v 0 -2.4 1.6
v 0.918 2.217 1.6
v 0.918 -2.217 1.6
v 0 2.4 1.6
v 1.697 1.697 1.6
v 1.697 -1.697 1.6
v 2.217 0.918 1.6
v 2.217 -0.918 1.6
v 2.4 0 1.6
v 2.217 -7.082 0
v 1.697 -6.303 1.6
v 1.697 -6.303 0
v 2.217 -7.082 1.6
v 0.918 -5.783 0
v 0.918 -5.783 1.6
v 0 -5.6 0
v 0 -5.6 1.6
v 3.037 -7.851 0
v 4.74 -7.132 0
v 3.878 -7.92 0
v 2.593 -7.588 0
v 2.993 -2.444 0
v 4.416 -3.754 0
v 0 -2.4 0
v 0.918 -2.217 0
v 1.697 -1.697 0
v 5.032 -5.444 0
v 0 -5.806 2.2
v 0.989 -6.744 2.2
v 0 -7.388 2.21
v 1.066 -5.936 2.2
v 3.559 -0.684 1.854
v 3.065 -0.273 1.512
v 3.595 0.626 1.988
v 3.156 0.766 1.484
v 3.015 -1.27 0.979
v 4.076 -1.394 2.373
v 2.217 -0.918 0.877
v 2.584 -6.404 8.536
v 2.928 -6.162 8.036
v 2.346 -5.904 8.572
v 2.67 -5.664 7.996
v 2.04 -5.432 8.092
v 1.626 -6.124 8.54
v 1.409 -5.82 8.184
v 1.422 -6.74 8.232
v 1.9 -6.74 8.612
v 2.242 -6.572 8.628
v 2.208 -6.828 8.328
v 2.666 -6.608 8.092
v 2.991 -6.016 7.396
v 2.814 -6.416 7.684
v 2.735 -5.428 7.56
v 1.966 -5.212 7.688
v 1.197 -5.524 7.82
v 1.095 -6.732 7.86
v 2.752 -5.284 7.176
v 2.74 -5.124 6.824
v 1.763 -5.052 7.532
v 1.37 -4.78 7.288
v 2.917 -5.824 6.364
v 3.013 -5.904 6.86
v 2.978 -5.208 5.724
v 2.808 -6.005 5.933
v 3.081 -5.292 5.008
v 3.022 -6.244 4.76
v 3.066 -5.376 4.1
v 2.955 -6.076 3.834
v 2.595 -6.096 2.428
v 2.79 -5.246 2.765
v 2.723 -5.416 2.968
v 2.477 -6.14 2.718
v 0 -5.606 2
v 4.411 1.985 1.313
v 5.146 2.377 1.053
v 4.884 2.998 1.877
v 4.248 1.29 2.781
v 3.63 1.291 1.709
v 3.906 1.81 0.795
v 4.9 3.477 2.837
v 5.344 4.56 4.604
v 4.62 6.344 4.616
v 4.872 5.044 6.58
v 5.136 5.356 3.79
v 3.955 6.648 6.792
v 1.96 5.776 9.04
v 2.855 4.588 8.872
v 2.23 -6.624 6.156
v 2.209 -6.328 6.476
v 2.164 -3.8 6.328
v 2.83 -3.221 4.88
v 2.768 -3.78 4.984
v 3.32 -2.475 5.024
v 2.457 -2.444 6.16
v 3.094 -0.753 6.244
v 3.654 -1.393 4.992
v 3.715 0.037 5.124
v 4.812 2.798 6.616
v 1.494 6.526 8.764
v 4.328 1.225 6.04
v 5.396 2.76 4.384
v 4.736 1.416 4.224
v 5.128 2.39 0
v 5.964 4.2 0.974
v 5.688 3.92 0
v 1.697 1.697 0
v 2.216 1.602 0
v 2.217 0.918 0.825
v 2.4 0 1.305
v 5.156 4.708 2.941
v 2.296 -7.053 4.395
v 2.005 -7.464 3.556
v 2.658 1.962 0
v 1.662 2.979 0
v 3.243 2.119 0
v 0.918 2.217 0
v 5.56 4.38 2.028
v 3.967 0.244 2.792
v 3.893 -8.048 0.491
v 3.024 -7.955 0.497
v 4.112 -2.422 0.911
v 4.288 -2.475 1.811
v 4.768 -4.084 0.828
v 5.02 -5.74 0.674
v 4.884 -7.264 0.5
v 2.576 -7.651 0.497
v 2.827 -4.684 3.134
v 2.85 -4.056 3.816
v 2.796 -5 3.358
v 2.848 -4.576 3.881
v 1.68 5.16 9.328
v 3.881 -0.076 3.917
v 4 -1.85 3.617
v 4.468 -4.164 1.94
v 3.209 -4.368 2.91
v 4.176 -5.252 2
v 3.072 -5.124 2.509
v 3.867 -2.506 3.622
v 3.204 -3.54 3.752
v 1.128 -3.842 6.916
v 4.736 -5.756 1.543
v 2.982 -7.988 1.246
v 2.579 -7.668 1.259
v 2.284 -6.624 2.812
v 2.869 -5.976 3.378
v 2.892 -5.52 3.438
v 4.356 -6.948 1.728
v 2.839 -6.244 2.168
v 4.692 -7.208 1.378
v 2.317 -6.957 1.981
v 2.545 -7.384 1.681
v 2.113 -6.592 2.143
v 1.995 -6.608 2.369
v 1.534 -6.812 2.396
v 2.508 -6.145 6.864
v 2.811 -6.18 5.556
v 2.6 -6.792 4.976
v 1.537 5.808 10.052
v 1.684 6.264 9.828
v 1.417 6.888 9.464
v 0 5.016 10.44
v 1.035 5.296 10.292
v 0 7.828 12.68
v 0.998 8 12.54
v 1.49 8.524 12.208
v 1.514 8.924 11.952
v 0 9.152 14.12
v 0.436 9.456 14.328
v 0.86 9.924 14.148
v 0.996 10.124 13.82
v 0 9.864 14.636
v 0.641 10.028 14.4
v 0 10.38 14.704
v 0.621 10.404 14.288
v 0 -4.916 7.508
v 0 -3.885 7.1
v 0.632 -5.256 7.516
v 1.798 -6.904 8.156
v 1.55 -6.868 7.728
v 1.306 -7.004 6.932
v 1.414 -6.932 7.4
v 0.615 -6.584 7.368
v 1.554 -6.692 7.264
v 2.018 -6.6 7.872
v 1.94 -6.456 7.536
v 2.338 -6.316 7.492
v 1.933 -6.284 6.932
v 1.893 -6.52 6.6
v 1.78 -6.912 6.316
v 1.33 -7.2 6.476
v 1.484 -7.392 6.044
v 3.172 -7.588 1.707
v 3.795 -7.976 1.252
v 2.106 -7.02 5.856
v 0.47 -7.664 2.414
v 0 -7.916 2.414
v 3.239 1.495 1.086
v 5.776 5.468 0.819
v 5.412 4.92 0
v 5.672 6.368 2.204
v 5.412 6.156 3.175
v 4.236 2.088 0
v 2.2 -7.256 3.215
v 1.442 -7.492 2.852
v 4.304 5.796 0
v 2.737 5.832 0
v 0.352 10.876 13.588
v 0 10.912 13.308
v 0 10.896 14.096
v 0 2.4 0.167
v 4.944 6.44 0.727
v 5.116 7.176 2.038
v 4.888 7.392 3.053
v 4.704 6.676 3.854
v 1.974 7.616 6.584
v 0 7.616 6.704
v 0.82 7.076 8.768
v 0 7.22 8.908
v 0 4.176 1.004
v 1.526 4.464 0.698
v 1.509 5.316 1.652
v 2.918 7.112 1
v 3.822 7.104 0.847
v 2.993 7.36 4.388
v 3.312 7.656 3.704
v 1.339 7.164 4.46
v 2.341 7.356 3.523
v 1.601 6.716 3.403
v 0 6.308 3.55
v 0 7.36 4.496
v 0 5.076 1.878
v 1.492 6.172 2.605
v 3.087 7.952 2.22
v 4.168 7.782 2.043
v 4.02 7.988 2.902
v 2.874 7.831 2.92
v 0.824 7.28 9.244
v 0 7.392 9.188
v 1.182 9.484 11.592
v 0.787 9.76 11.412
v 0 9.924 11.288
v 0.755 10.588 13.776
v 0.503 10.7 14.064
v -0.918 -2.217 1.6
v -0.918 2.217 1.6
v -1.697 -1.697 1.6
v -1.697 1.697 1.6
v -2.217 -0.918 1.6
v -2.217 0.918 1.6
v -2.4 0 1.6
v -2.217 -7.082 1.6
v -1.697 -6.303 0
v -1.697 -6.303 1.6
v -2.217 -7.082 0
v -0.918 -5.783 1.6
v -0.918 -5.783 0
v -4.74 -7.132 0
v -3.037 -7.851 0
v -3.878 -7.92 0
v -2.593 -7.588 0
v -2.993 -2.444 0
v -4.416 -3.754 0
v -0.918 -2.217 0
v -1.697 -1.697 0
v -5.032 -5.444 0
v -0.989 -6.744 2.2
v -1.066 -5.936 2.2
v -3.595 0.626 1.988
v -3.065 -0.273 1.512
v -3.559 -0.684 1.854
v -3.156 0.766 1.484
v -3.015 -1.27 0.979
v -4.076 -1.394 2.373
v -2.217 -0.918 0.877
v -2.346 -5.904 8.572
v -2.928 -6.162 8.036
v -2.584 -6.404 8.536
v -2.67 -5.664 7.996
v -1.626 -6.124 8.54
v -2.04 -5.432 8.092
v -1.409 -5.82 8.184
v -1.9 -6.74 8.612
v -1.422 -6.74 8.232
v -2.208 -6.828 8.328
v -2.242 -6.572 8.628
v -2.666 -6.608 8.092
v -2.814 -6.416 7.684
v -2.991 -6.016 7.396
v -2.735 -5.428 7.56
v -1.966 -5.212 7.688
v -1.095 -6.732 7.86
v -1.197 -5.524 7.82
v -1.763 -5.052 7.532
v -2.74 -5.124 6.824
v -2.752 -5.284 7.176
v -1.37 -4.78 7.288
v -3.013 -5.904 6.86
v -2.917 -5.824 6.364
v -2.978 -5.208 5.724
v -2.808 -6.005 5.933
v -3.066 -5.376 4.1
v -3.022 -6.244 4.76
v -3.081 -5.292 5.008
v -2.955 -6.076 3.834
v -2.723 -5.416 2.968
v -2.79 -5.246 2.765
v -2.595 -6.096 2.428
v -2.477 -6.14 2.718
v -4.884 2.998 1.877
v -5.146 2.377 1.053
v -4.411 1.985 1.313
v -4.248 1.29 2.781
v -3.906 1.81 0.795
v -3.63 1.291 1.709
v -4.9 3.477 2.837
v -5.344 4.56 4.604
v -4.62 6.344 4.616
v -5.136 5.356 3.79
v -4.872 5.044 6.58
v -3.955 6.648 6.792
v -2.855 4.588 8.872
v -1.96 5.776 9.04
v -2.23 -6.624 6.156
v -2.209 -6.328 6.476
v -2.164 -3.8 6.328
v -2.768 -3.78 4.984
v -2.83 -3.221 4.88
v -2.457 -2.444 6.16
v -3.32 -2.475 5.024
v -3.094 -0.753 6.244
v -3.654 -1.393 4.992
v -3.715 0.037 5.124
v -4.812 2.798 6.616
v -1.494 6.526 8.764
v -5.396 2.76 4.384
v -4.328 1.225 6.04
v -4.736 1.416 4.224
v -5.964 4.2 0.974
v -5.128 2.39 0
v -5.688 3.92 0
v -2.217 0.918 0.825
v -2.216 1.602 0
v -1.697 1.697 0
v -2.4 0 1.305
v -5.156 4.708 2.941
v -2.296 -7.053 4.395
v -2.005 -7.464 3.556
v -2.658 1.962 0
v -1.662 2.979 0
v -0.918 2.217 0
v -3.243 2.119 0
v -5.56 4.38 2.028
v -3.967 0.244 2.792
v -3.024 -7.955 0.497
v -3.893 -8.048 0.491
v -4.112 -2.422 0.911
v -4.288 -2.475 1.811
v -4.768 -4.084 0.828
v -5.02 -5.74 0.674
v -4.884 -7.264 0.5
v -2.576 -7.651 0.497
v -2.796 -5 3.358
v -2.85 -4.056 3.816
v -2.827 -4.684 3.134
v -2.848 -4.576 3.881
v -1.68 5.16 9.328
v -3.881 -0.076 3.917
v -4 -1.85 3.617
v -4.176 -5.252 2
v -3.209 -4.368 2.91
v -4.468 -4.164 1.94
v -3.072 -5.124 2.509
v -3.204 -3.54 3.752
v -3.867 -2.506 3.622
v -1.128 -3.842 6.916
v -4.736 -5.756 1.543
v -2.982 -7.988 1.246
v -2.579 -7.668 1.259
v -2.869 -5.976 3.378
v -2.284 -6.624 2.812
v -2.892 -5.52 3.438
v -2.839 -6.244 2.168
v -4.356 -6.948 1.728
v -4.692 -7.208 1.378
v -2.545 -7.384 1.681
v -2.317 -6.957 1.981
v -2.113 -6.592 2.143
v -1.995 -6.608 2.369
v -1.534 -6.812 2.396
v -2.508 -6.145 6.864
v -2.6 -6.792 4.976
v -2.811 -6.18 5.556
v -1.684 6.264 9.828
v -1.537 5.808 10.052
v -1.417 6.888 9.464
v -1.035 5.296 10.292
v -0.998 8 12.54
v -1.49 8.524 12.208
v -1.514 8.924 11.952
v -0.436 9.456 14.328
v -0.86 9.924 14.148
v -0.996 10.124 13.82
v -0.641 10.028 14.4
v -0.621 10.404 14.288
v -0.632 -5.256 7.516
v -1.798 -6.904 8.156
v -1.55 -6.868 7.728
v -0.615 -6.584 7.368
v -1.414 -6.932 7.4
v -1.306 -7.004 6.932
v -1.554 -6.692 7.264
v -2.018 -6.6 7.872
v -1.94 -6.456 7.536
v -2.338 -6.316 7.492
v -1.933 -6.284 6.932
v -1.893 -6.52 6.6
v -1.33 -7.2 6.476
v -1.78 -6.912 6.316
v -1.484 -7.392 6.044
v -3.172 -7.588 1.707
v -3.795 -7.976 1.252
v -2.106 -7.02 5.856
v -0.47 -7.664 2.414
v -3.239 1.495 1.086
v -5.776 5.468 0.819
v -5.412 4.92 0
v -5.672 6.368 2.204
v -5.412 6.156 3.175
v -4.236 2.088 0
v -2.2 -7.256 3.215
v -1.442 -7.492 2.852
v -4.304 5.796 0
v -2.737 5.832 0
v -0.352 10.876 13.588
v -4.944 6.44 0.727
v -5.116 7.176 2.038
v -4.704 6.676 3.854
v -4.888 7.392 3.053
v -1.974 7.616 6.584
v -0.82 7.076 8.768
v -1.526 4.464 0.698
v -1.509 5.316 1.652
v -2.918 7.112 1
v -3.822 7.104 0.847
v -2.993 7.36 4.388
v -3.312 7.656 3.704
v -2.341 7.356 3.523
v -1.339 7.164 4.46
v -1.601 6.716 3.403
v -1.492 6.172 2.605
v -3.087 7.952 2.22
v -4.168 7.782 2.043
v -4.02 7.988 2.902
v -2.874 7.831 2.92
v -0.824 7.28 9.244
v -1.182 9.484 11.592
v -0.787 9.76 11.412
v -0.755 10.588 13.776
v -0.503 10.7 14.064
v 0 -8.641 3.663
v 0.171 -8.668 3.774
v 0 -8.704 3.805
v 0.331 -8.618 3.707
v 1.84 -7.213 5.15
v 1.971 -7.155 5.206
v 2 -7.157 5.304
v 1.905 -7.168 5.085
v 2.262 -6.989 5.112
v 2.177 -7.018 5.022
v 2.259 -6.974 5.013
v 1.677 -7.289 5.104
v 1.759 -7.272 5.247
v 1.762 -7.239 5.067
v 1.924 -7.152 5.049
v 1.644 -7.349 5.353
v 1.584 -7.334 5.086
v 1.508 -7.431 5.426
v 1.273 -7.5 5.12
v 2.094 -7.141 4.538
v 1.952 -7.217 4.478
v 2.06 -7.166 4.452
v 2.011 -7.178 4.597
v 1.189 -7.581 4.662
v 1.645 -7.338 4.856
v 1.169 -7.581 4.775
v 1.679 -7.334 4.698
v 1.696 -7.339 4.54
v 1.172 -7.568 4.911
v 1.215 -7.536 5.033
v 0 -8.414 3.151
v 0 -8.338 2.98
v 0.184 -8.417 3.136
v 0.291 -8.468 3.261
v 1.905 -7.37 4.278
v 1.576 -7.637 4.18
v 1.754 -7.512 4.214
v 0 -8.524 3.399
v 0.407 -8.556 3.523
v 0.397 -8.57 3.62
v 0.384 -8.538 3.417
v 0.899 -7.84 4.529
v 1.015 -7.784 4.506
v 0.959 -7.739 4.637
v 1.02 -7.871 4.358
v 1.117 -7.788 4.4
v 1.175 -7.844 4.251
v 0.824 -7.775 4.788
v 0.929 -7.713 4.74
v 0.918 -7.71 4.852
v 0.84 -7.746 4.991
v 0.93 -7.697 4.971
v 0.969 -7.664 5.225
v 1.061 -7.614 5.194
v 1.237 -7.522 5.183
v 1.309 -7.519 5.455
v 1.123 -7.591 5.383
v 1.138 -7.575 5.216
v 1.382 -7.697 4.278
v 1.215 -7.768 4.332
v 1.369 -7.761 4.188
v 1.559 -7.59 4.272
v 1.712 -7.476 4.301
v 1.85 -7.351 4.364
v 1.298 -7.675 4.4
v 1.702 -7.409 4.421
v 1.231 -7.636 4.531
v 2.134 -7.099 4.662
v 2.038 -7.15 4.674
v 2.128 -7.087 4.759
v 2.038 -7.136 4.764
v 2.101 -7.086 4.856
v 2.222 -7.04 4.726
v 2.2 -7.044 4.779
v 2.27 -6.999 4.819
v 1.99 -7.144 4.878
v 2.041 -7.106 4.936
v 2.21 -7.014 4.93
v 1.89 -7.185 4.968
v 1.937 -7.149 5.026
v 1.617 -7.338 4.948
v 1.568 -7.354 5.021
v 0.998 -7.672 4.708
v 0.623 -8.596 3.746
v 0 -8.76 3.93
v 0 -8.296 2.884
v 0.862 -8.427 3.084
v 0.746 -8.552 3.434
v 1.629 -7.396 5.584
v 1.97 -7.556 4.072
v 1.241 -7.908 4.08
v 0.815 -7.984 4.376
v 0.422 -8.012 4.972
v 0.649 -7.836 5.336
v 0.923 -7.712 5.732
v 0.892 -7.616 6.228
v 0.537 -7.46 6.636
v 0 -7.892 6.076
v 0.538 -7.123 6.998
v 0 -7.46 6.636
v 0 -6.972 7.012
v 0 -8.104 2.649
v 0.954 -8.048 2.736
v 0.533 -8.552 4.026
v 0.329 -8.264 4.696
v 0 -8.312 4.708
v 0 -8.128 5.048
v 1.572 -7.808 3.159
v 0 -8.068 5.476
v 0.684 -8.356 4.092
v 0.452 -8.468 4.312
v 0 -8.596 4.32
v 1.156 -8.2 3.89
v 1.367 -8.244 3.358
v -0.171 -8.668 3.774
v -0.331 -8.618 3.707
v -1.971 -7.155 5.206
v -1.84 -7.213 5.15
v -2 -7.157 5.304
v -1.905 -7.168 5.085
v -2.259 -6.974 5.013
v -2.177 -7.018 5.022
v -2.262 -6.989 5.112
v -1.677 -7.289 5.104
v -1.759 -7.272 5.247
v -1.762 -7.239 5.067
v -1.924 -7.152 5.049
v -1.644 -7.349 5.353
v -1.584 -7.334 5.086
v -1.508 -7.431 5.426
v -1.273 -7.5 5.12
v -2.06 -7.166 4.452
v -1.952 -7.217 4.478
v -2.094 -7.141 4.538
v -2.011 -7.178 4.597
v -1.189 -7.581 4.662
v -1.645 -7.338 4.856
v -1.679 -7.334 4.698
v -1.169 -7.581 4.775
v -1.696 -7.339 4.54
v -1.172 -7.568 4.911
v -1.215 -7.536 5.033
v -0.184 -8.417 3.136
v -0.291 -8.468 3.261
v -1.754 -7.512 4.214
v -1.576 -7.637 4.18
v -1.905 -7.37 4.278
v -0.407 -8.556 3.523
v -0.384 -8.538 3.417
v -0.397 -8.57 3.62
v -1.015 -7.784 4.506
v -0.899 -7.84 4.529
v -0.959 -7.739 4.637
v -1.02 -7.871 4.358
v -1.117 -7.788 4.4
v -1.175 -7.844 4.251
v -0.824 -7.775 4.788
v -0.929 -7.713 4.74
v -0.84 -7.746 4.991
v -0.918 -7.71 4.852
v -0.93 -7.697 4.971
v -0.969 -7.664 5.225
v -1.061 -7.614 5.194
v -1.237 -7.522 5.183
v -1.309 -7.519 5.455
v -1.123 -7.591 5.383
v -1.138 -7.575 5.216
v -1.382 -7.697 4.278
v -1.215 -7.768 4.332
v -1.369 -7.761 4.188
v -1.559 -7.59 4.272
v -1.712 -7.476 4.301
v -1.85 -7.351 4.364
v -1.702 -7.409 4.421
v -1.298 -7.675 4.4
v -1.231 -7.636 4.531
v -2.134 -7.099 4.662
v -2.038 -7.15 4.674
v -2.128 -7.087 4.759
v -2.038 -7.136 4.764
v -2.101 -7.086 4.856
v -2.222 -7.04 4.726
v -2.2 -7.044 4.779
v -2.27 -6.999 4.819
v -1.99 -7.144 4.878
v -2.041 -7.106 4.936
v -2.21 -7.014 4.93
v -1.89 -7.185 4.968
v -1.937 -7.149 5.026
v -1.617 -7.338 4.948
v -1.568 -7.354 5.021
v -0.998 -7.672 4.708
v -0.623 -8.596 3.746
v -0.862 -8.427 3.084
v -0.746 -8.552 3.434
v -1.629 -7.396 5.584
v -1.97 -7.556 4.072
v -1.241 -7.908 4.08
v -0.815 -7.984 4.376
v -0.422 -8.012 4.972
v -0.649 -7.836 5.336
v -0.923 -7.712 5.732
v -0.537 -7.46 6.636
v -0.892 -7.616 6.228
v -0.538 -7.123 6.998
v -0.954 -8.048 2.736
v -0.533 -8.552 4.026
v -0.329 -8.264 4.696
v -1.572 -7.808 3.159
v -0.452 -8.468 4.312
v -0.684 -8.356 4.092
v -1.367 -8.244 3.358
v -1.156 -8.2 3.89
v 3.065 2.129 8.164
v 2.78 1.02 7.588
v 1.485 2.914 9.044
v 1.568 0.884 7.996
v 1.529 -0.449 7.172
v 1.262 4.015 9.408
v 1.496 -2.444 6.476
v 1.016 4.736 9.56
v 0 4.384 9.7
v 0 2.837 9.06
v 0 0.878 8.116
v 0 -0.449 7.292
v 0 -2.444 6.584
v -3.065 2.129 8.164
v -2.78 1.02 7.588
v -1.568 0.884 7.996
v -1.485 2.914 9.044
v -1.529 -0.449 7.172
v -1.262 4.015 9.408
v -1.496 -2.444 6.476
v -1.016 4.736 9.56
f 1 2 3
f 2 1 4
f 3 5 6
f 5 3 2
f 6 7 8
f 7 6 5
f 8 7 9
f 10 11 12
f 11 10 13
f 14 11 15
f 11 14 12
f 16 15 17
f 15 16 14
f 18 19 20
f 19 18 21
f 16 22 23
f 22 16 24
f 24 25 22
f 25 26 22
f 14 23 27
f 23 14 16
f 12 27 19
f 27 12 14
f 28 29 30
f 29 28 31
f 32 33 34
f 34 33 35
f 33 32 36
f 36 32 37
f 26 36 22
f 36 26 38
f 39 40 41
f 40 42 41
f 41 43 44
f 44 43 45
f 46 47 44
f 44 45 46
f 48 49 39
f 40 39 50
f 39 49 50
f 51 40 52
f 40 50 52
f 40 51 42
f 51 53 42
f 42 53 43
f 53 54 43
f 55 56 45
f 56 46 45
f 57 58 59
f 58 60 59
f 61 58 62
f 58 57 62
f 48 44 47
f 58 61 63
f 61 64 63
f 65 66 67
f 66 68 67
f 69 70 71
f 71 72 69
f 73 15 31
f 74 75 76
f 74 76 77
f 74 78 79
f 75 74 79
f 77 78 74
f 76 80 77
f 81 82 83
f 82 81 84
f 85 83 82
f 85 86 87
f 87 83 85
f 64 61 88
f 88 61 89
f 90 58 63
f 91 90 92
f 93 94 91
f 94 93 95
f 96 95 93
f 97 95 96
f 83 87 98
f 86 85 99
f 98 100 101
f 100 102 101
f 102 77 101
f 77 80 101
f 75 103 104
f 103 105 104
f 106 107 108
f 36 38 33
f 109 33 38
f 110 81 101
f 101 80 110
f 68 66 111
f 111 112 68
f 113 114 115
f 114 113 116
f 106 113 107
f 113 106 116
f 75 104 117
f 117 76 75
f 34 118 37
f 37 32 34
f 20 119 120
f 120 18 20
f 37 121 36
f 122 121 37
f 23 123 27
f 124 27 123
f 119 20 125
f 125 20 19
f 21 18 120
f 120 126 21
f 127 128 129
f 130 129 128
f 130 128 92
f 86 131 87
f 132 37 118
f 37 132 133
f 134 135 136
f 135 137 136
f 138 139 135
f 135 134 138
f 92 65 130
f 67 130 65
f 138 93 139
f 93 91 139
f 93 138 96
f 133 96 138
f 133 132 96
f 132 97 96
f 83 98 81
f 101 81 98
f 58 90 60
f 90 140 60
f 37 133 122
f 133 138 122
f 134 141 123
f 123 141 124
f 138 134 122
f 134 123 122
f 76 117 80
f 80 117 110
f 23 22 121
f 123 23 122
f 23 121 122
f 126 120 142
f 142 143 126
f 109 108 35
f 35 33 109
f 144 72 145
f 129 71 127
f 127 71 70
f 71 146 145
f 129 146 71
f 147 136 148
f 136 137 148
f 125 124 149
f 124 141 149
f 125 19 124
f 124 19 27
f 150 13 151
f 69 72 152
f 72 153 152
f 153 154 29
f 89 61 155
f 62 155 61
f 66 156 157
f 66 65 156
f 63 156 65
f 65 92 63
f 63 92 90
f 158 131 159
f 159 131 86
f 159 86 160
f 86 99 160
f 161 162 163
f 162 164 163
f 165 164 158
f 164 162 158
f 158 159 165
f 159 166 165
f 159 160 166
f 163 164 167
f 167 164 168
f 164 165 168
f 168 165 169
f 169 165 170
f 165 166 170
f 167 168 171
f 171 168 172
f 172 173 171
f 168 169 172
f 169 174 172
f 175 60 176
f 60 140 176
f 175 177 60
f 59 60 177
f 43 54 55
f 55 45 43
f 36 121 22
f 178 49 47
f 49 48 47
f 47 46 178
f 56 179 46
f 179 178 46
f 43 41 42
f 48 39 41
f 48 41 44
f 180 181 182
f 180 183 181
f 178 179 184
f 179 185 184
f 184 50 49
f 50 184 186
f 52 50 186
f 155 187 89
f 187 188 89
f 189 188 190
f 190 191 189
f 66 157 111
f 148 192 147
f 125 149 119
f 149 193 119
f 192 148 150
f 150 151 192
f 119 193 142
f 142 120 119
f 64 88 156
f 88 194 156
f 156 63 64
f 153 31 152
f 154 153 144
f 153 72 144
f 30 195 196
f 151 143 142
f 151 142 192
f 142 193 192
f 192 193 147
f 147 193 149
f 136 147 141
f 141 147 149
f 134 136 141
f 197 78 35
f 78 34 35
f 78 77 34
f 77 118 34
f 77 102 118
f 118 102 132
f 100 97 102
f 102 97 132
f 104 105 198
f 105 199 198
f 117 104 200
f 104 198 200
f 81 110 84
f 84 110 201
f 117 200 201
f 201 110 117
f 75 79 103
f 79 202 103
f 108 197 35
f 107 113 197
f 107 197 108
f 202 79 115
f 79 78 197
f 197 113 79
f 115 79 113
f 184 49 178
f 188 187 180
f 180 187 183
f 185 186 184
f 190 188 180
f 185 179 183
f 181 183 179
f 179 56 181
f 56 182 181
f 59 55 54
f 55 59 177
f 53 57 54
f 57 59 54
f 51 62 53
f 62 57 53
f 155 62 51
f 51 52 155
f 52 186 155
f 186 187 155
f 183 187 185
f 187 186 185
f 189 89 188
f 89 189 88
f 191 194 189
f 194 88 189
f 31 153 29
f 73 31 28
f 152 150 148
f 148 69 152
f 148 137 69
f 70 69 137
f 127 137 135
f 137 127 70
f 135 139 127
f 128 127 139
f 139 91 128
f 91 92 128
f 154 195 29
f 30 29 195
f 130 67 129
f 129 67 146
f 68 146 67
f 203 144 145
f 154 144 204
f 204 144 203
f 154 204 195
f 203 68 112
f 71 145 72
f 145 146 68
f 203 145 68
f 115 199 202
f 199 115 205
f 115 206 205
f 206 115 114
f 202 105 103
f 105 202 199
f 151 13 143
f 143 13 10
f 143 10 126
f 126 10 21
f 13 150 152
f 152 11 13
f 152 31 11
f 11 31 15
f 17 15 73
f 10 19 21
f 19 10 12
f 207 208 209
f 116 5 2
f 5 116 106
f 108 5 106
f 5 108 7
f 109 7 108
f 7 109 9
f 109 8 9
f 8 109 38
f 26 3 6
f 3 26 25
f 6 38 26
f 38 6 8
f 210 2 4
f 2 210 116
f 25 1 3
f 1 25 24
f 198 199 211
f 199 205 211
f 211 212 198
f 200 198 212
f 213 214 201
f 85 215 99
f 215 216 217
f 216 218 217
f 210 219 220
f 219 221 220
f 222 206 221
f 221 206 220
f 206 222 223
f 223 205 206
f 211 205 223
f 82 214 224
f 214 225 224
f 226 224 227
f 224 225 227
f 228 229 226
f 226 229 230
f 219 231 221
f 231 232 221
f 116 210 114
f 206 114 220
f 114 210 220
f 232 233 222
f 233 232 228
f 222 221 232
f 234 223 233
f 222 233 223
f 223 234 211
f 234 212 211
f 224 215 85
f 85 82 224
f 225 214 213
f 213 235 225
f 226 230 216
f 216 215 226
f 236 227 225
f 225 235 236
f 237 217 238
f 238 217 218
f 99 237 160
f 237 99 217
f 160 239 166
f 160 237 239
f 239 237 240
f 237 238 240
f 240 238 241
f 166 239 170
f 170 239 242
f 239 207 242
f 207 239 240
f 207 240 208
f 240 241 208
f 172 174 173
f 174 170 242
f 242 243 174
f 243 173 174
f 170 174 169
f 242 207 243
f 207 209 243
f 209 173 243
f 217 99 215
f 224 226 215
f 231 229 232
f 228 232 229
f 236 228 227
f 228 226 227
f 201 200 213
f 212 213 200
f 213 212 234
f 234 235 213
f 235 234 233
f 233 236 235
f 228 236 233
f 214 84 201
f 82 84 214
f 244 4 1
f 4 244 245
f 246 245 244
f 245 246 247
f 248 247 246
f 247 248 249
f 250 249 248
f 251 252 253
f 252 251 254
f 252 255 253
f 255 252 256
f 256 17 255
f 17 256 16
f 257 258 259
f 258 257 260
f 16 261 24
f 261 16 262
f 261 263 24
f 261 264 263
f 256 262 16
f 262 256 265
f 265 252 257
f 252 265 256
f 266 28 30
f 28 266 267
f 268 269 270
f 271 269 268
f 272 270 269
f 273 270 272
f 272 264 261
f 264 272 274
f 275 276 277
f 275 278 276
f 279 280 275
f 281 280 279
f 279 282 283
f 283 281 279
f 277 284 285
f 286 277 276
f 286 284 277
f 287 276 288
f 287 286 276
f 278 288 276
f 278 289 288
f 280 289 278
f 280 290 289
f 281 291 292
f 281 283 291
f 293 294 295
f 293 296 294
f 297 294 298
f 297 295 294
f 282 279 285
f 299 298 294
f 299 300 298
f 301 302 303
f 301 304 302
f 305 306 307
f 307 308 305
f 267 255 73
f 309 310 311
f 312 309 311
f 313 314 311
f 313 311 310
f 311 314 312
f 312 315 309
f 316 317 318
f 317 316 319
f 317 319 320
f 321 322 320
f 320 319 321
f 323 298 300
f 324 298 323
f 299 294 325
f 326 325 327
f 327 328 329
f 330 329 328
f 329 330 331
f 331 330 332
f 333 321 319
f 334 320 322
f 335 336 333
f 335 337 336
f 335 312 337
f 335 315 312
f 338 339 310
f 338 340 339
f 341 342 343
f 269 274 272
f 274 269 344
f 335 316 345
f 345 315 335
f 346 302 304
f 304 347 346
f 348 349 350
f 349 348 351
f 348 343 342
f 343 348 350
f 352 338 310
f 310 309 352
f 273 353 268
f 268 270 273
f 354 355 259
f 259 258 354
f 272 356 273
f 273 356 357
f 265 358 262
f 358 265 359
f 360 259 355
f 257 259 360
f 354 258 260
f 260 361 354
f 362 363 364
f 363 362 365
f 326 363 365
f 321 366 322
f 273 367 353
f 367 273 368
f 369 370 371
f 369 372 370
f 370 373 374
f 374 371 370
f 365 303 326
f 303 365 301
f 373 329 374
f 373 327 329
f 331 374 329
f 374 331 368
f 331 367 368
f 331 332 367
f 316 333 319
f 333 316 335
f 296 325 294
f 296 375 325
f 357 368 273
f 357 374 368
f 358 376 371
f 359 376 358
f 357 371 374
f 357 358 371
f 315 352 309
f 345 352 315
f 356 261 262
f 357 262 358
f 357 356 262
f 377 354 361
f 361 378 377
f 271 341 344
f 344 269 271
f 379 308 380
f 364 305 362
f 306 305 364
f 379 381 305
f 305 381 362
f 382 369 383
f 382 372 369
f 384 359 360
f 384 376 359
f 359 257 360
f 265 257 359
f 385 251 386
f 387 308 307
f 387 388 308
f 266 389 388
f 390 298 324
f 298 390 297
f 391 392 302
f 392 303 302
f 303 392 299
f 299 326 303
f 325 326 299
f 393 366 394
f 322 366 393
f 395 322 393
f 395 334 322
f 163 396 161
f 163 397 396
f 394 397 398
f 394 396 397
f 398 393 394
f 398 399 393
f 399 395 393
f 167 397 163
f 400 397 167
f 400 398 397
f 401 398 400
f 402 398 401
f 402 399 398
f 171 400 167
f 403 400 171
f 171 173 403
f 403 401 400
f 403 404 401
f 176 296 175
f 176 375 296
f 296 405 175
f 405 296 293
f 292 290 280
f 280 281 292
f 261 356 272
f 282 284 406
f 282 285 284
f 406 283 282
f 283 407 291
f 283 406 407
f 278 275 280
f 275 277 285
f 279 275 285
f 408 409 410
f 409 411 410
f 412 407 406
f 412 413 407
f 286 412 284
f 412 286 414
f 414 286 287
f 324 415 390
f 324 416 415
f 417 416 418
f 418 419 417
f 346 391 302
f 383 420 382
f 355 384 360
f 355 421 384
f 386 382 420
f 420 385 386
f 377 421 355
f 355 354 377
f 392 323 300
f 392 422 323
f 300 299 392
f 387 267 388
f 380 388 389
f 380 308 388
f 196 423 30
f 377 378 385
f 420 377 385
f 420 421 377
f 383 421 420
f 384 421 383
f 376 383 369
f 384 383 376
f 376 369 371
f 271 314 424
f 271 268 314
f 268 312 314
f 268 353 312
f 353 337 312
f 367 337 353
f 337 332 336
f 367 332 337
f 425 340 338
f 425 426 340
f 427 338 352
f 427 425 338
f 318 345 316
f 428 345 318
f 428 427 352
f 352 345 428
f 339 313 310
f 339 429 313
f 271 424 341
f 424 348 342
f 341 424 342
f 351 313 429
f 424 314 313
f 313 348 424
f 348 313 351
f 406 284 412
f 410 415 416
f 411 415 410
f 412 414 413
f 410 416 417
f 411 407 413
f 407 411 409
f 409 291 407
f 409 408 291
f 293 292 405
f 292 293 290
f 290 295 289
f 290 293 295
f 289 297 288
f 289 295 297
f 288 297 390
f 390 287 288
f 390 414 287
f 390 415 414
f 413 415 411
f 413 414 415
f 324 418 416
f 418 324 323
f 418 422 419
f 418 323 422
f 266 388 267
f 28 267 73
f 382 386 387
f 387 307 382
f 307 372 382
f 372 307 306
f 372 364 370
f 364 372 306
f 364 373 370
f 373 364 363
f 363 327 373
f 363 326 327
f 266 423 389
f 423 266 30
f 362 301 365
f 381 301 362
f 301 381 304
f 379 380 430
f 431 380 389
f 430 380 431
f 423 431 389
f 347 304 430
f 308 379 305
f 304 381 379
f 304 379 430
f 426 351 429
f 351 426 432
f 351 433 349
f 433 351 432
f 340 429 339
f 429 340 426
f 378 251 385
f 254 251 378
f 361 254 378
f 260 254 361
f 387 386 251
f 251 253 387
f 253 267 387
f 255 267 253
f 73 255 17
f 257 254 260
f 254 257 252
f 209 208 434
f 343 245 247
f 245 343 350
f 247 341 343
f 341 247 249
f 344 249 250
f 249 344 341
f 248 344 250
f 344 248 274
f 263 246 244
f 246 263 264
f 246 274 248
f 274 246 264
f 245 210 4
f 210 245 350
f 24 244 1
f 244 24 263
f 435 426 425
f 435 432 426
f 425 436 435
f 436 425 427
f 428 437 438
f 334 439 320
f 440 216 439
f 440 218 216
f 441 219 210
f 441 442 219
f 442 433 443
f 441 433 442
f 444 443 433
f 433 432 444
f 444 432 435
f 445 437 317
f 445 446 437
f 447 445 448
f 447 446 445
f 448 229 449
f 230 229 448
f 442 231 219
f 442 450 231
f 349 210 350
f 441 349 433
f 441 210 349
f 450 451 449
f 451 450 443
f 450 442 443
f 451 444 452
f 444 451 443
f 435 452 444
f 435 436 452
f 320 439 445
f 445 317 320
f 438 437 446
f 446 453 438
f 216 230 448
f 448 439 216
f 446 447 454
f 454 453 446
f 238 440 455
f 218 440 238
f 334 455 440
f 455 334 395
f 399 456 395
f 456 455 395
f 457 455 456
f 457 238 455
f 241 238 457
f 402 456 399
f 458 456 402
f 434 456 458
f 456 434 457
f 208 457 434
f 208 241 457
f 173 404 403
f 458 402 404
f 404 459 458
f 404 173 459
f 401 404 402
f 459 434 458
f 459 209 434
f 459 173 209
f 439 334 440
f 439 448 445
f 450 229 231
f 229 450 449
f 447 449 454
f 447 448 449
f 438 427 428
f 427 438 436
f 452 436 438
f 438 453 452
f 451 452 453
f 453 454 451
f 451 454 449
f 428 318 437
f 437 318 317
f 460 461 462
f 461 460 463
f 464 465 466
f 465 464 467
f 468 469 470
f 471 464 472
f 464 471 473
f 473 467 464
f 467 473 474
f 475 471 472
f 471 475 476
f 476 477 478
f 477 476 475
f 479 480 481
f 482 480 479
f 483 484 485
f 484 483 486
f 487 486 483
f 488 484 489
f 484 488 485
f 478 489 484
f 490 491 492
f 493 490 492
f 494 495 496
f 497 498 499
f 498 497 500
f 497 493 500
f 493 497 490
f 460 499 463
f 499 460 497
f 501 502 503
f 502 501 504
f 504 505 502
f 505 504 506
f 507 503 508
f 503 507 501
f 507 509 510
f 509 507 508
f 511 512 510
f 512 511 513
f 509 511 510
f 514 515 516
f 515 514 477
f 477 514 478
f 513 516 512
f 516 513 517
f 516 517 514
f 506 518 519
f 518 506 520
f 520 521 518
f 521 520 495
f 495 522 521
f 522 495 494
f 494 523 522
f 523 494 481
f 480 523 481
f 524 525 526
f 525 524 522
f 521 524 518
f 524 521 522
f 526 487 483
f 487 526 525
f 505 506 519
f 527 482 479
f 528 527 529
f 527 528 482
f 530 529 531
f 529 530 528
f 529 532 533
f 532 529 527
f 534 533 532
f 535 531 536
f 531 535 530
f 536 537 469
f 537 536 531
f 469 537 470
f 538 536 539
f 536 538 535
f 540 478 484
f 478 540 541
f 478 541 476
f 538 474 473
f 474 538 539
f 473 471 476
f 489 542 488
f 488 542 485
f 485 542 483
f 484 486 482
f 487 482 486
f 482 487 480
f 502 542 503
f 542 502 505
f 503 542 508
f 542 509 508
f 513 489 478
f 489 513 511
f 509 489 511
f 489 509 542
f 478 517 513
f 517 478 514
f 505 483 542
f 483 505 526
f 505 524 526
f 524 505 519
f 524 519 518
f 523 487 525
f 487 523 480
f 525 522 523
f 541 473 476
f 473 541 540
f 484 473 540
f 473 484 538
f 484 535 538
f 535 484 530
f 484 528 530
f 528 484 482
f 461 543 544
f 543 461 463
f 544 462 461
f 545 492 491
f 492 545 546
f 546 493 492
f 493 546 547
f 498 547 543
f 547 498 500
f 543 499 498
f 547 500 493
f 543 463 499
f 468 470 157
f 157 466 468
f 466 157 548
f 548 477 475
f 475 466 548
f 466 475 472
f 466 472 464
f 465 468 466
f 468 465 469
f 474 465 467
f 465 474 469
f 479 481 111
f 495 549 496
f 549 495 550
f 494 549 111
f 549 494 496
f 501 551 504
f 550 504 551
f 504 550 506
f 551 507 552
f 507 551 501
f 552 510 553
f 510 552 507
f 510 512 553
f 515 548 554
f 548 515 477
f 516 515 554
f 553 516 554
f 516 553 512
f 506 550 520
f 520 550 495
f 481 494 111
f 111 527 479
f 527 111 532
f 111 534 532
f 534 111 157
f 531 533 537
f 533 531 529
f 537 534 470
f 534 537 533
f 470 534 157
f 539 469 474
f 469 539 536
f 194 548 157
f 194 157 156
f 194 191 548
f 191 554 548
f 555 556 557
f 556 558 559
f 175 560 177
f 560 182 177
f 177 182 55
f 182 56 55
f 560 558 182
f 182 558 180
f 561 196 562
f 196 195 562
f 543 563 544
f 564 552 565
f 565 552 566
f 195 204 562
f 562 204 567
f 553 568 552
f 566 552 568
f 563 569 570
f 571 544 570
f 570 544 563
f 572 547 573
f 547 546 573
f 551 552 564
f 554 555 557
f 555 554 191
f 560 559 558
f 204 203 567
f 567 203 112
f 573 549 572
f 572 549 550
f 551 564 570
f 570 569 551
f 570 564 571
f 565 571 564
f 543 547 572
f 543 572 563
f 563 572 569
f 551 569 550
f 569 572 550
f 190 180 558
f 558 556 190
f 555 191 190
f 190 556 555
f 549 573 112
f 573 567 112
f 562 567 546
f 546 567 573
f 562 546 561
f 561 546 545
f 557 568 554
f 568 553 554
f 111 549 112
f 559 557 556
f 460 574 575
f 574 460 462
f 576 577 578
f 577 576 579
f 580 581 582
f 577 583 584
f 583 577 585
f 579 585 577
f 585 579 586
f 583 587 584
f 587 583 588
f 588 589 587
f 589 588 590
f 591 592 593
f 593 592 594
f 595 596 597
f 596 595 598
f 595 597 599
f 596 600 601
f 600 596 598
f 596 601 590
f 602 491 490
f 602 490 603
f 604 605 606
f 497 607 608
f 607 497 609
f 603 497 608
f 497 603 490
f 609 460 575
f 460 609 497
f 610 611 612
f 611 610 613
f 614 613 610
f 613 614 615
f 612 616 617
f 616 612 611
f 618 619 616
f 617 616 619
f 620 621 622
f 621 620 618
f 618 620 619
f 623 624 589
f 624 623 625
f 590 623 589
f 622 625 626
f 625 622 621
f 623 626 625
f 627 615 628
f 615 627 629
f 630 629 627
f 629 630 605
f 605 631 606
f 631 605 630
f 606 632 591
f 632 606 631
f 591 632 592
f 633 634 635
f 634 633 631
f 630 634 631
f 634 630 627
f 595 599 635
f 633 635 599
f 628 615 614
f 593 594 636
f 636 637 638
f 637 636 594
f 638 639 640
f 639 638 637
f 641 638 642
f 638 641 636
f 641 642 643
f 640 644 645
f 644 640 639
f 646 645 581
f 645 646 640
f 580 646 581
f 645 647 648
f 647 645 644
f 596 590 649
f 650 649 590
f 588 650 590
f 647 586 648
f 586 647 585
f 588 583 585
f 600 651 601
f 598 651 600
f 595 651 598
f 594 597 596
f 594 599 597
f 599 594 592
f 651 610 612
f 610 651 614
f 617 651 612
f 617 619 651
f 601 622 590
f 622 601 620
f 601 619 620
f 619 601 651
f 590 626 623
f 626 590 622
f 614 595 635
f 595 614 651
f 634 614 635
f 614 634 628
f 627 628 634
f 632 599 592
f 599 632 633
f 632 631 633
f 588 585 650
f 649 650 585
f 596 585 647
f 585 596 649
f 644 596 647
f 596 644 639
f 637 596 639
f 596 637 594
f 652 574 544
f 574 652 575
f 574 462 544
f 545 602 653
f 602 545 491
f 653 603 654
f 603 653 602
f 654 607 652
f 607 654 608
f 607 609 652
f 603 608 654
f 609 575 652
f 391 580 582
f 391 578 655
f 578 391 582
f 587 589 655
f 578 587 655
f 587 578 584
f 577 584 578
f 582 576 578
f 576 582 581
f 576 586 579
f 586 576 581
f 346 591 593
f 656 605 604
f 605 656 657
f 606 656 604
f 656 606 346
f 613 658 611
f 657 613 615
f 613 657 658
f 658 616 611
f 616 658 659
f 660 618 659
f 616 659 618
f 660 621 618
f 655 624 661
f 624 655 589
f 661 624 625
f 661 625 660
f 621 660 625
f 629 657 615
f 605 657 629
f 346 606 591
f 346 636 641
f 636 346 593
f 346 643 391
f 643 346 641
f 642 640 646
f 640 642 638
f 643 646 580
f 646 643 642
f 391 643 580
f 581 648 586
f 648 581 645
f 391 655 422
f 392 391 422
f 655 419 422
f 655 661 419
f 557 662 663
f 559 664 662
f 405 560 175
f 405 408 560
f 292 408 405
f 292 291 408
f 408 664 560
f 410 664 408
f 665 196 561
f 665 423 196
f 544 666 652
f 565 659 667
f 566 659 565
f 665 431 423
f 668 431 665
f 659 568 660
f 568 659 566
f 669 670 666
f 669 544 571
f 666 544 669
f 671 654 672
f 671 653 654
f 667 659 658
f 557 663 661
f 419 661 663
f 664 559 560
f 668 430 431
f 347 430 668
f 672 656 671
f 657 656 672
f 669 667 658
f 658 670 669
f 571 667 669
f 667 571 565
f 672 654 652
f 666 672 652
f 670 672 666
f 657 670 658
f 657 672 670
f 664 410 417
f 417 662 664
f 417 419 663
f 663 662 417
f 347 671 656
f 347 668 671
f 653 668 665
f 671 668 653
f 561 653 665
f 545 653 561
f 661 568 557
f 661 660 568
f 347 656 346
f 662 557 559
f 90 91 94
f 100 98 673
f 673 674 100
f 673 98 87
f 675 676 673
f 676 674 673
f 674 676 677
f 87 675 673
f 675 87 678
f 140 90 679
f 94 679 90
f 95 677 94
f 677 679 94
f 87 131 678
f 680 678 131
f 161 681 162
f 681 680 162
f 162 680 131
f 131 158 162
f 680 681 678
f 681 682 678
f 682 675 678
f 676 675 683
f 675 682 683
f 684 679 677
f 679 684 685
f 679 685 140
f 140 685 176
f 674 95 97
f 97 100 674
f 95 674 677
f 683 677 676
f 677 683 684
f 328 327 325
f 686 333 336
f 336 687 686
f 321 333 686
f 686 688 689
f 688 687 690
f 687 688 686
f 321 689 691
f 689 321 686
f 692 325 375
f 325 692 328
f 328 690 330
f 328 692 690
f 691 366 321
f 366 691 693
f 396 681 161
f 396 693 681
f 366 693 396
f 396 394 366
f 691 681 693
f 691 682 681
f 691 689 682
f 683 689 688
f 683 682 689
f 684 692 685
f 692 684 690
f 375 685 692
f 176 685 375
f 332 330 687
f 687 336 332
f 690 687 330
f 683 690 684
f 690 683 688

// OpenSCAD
use <../lib.scad>
use <s/6251p01s01.scad>
use <s/6251s01.scad>
use <s/6251s03.scad>
function ldraw_lib__6251p01() = [
// 0 Animal Cat Crouching with Medium Blue Eyes, Black Pupils, Eyelashes and Nose Pattern
// 0 Name: 6251p01.dat
// 0 Author: Willy Tschager [Holly-Wood]
// 0 !LDRAW_ORG Part UPDATE 2022-06
// 0 !LICENSE Licensed under CC BY 2.0 and CC BY 4.0 : see CAreadme.txt
// 
// 0 BFC CERTIFY CW
  [0,"BFC","CERTIFY"],
  [0,"BFC","CW"],
// 
// 0 !KEYWORDS Belville, Bricklink 6251pb05, creature, mousetrap, pet, set 5823
// 
// 0 !HISTORY 2022-12-20 [PTadmin] Official Update 2022-06
// 
// 
// 0 // Half without Patternable Area
// 
// 1 16 0 0 0 1 0 0 0 1 0 0 0 1 s\6251s01.dat
  [1,16,0,0,0,1,0,0,0,1,0,0,0,1, ldraw_lib__s__6251s01()],
// 1 16 0 0 0 -1 0 0 0 1 0 0 0 1 s\6251s01.dat
  [1,16,0,0,0,-1,0,0,0,1,0,0,0,1, ldraw_lib__s__6251s01()],
// 
// 0 // Patternable Area
// 1 16 0 0 0 1 0 0 0 1 0 0 0 1 s\6251p01s01.dat
  [1,16,0,0,0,1,0,0,0,1,0,0,0,1, ldraw_lib__s__6251p01s01()],
// 1 16 0 0 0 -1 0 0 0 1 0 0 0 1 s\6251p01s01.dat
  [1,16,0,0,0,-1,0,0,0,1,0,0,0,1, ldraw_lib__s__6251p01s01()],
// 
// 0 // Patternable Area Back
// 1 16 0 0 0 1 0 0 0 1 0 0 0 1 s\6251s03.dat
  [1,16,0,0,0,1,0,0,0,1,0,0,0,1, ldraw_lib__s__6251s03()],
// 1 16 0 0 0 -1 0 0 0 1 0 0 0 1 s\6251s03.dat
  [1,16,0,0,0,-1,0,0,0,1,0,0,0,1, ldraw_lib__s__6251s03()],
];
makepoly(ldraw_lib__6251p01(), line=0.2);
